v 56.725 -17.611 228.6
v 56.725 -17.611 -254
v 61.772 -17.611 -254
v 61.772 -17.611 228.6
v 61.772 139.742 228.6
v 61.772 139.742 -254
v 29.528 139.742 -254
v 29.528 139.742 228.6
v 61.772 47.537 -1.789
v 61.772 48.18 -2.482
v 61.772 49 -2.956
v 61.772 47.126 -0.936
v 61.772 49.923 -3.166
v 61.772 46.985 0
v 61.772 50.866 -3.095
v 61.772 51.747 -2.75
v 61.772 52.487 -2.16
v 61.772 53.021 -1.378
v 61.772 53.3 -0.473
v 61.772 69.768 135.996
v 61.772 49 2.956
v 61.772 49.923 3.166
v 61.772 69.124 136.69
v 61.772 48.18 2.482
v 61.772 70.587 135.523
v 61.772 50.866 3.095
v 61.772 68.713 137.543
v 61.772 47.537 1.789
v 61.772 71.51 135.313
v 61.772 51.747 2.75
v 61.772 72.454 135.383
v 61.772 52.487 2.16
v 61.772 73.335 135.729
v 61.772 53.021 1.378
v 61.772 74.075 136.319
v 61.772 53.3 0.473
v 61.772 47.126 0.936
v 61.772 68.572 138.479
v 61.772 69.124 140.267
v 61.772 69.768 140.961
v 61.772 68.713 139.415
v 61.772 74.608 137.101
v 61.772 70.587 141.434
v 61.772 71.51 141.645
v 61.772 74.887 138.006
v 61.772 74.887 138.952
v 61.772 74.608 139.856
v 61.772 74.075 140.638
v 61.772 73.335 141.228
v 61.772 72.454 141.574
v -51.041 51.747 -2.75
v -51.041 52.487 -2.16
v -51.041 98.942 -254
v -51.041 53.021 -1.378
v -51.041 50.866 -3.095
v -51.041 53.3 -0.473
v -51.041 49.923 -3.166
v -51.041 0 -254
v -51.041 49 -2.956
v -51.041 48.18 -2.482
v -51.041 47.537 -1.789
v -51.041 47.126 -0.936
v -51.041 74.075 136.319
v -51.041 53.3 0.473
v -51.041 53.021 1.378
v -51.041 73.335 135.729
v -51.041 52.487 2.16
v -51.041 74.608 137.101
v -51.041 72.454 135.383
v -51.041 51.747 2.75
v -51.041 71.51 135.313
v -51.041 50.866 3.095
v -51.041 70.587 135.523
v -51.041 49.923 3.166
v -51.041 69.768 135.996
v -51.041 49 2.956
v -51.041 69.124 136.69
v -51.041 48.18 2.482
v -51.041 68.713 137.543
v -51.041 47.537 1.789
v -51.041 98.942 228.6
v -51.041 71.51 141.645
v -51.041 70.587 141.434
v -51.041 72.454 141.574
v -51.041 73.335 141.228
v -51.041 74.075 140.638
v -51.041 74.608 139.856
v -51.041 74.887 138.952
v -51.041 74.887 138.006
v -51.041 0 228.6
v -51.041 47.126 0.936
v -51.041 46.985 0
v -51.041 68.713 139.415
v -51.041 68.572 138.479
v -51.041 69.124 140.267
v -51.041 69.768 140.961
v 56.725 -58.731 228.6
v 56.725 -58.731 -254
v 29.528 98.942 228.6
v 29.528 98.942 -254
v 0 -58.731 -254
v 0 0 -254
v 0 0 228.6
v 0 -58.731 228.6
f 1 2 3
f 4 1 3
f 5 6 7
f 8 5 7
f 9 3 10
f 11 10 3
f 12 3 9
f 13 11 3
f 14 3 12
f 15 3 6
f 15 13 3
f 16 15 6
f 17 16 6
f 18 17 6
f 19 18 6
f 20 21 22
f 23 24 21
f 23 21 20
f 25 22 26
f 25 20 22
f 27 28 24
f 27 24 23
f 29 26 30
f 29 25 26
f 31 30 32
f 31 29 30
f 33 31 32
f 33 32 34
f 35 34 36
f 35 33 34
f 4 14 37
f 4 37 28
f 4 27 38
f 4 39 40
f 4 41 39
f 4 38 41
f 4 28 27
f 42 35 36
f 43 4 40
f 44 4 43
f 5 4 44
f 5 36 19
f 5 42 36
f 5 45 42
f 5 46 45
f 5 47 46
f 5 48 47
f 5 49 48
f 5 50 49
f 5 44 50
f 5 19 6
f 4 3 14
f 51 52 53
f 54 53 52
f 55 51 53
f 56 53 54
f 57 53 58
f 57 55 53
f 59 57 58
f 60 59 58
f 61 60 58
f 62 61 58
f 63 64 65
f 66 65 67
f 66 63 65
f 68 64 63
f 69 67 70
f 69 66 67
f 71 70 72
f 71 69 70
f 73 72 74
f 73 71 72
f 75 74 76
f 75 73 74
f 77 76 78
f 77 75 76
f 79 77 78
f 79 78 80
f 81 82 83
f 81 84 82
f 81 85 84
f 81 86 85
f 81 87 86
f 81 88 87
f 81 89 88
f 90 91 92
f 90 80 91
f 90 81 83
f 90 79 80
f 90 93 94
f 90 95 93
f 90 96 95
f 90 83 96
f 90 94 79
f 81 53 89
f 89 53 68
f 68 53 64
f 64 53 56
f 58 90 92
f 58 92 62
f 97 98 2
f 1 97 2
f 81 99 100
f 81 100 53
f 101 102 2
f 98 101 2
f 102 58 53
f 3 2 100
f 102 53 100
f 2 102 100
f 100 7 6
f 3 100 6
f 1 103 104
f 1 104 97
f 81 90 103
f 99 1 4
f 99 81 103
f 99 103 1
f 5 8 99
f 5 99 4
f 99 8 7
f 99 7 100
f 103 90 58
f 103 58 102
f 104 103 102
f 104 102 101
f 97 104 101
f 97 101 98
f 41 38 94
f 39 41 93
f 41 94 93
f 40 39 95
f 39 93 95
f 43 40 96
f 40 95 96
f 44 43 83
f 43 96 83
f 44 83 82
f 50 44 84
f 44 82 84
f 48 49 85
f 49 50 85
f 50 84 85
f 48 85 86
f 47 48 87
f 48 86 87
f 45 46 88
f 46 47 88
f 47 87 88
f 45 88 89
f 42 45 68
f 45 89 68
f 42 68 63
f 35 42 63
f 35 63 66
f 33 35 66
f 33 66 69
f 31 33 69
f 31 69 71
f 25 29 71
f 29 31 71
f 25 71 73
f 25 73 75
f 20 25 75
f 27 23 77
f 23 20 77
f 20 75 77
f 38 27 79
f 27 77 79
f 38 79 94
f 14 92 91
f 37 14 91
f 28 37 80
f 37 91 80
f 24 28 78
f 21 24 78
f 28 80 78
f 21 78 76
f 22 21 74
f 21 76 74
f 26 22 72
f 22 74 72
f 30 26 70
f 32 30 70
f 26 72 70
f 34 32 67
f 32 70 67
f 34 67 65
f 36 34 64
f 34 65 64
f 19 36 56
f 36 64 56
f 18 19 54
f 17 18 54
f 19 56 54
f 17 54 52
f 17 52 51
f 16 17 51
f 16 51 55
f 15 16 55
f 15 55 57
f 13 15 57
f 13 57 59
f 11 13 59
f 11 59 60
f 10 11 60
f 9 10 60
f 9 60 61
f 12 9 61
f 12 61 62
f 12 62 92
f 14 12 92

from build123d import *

# Parameters (mm, degrees)
F1_DEPTH      = 254
F1_DEPTH_BACK = 254
F3_D          = 6.35
F4_R          = 49.5981028819
F4_R_2        = 3.175
F5_DEPTH      = 25.4
F6_DEPTH      = 25.4
F7_DEPTH      = 25.4


with BuildPart() as f1:
    # F0 (on Top) → F1 (new body, two sides)
    with BuildSketch(Plane.XY) as f1_sk:
        Polygon((-51.0406941175, 0), (0, 0), (0, -58.7314069271), (56.7247420549, -58.7314069271), (56.7247420549, -17.6112949848), (87.1720016003, -17.6112949848), (87.1720016003, 139.7417336702), (29.5281931758, 139.7417336702), (29.5281931758, 98.9419966936), (-51.0406941175, 98.9419966936), align=None)
    extrude(amount=F1_DEPTH)
    extrude(f1_sk.sketch, amount=-F1_DEPTH_BACK)

    # F3 (through all)
    with Locations(Plane.YZ.offset(87.1720016003)):
        with Locations((71.7472732067, 138.4787261486), (50.1599907875, 0)):
            Hole(F3_D / 2)

    # F4 (on face) → F5 (cut)
    with BuildSketch(Plane.YZ.offset(87.1720016003)):
        with Locations((71.7472732067, 138.4787261486)):
            Circle(F4_R)
        with Locations((71.7472732067, 138.4787261486)):
            Circle(F4_R_2, mode=Mode.SUBTRACT)
    extrude(amount=-F5_DEPTH, mode=Mode.SUBTRACT)

    # F6 (cut): a face of the model
    f6_faces = [f1.faces().sort_by_distance(p)[0] for p in [
        (26.0044573743, 42.9582236977, 254),
    ]]
    extrude(f6_faces, amount=-F6_DEPTH, mode=Mode.SUBTRACT)

    # F7 (cut): a face of the model
    f7_faces = [f1.faces().sort_by_distance(p)[0] for p in [
        (87.1720016003, 59.8594463551, -29.8423997795),
    ]]
    extrude(f7_faces, amount=-F7_DEPTH, mode=Mode.SUBTRACT)


solid = f1.part
